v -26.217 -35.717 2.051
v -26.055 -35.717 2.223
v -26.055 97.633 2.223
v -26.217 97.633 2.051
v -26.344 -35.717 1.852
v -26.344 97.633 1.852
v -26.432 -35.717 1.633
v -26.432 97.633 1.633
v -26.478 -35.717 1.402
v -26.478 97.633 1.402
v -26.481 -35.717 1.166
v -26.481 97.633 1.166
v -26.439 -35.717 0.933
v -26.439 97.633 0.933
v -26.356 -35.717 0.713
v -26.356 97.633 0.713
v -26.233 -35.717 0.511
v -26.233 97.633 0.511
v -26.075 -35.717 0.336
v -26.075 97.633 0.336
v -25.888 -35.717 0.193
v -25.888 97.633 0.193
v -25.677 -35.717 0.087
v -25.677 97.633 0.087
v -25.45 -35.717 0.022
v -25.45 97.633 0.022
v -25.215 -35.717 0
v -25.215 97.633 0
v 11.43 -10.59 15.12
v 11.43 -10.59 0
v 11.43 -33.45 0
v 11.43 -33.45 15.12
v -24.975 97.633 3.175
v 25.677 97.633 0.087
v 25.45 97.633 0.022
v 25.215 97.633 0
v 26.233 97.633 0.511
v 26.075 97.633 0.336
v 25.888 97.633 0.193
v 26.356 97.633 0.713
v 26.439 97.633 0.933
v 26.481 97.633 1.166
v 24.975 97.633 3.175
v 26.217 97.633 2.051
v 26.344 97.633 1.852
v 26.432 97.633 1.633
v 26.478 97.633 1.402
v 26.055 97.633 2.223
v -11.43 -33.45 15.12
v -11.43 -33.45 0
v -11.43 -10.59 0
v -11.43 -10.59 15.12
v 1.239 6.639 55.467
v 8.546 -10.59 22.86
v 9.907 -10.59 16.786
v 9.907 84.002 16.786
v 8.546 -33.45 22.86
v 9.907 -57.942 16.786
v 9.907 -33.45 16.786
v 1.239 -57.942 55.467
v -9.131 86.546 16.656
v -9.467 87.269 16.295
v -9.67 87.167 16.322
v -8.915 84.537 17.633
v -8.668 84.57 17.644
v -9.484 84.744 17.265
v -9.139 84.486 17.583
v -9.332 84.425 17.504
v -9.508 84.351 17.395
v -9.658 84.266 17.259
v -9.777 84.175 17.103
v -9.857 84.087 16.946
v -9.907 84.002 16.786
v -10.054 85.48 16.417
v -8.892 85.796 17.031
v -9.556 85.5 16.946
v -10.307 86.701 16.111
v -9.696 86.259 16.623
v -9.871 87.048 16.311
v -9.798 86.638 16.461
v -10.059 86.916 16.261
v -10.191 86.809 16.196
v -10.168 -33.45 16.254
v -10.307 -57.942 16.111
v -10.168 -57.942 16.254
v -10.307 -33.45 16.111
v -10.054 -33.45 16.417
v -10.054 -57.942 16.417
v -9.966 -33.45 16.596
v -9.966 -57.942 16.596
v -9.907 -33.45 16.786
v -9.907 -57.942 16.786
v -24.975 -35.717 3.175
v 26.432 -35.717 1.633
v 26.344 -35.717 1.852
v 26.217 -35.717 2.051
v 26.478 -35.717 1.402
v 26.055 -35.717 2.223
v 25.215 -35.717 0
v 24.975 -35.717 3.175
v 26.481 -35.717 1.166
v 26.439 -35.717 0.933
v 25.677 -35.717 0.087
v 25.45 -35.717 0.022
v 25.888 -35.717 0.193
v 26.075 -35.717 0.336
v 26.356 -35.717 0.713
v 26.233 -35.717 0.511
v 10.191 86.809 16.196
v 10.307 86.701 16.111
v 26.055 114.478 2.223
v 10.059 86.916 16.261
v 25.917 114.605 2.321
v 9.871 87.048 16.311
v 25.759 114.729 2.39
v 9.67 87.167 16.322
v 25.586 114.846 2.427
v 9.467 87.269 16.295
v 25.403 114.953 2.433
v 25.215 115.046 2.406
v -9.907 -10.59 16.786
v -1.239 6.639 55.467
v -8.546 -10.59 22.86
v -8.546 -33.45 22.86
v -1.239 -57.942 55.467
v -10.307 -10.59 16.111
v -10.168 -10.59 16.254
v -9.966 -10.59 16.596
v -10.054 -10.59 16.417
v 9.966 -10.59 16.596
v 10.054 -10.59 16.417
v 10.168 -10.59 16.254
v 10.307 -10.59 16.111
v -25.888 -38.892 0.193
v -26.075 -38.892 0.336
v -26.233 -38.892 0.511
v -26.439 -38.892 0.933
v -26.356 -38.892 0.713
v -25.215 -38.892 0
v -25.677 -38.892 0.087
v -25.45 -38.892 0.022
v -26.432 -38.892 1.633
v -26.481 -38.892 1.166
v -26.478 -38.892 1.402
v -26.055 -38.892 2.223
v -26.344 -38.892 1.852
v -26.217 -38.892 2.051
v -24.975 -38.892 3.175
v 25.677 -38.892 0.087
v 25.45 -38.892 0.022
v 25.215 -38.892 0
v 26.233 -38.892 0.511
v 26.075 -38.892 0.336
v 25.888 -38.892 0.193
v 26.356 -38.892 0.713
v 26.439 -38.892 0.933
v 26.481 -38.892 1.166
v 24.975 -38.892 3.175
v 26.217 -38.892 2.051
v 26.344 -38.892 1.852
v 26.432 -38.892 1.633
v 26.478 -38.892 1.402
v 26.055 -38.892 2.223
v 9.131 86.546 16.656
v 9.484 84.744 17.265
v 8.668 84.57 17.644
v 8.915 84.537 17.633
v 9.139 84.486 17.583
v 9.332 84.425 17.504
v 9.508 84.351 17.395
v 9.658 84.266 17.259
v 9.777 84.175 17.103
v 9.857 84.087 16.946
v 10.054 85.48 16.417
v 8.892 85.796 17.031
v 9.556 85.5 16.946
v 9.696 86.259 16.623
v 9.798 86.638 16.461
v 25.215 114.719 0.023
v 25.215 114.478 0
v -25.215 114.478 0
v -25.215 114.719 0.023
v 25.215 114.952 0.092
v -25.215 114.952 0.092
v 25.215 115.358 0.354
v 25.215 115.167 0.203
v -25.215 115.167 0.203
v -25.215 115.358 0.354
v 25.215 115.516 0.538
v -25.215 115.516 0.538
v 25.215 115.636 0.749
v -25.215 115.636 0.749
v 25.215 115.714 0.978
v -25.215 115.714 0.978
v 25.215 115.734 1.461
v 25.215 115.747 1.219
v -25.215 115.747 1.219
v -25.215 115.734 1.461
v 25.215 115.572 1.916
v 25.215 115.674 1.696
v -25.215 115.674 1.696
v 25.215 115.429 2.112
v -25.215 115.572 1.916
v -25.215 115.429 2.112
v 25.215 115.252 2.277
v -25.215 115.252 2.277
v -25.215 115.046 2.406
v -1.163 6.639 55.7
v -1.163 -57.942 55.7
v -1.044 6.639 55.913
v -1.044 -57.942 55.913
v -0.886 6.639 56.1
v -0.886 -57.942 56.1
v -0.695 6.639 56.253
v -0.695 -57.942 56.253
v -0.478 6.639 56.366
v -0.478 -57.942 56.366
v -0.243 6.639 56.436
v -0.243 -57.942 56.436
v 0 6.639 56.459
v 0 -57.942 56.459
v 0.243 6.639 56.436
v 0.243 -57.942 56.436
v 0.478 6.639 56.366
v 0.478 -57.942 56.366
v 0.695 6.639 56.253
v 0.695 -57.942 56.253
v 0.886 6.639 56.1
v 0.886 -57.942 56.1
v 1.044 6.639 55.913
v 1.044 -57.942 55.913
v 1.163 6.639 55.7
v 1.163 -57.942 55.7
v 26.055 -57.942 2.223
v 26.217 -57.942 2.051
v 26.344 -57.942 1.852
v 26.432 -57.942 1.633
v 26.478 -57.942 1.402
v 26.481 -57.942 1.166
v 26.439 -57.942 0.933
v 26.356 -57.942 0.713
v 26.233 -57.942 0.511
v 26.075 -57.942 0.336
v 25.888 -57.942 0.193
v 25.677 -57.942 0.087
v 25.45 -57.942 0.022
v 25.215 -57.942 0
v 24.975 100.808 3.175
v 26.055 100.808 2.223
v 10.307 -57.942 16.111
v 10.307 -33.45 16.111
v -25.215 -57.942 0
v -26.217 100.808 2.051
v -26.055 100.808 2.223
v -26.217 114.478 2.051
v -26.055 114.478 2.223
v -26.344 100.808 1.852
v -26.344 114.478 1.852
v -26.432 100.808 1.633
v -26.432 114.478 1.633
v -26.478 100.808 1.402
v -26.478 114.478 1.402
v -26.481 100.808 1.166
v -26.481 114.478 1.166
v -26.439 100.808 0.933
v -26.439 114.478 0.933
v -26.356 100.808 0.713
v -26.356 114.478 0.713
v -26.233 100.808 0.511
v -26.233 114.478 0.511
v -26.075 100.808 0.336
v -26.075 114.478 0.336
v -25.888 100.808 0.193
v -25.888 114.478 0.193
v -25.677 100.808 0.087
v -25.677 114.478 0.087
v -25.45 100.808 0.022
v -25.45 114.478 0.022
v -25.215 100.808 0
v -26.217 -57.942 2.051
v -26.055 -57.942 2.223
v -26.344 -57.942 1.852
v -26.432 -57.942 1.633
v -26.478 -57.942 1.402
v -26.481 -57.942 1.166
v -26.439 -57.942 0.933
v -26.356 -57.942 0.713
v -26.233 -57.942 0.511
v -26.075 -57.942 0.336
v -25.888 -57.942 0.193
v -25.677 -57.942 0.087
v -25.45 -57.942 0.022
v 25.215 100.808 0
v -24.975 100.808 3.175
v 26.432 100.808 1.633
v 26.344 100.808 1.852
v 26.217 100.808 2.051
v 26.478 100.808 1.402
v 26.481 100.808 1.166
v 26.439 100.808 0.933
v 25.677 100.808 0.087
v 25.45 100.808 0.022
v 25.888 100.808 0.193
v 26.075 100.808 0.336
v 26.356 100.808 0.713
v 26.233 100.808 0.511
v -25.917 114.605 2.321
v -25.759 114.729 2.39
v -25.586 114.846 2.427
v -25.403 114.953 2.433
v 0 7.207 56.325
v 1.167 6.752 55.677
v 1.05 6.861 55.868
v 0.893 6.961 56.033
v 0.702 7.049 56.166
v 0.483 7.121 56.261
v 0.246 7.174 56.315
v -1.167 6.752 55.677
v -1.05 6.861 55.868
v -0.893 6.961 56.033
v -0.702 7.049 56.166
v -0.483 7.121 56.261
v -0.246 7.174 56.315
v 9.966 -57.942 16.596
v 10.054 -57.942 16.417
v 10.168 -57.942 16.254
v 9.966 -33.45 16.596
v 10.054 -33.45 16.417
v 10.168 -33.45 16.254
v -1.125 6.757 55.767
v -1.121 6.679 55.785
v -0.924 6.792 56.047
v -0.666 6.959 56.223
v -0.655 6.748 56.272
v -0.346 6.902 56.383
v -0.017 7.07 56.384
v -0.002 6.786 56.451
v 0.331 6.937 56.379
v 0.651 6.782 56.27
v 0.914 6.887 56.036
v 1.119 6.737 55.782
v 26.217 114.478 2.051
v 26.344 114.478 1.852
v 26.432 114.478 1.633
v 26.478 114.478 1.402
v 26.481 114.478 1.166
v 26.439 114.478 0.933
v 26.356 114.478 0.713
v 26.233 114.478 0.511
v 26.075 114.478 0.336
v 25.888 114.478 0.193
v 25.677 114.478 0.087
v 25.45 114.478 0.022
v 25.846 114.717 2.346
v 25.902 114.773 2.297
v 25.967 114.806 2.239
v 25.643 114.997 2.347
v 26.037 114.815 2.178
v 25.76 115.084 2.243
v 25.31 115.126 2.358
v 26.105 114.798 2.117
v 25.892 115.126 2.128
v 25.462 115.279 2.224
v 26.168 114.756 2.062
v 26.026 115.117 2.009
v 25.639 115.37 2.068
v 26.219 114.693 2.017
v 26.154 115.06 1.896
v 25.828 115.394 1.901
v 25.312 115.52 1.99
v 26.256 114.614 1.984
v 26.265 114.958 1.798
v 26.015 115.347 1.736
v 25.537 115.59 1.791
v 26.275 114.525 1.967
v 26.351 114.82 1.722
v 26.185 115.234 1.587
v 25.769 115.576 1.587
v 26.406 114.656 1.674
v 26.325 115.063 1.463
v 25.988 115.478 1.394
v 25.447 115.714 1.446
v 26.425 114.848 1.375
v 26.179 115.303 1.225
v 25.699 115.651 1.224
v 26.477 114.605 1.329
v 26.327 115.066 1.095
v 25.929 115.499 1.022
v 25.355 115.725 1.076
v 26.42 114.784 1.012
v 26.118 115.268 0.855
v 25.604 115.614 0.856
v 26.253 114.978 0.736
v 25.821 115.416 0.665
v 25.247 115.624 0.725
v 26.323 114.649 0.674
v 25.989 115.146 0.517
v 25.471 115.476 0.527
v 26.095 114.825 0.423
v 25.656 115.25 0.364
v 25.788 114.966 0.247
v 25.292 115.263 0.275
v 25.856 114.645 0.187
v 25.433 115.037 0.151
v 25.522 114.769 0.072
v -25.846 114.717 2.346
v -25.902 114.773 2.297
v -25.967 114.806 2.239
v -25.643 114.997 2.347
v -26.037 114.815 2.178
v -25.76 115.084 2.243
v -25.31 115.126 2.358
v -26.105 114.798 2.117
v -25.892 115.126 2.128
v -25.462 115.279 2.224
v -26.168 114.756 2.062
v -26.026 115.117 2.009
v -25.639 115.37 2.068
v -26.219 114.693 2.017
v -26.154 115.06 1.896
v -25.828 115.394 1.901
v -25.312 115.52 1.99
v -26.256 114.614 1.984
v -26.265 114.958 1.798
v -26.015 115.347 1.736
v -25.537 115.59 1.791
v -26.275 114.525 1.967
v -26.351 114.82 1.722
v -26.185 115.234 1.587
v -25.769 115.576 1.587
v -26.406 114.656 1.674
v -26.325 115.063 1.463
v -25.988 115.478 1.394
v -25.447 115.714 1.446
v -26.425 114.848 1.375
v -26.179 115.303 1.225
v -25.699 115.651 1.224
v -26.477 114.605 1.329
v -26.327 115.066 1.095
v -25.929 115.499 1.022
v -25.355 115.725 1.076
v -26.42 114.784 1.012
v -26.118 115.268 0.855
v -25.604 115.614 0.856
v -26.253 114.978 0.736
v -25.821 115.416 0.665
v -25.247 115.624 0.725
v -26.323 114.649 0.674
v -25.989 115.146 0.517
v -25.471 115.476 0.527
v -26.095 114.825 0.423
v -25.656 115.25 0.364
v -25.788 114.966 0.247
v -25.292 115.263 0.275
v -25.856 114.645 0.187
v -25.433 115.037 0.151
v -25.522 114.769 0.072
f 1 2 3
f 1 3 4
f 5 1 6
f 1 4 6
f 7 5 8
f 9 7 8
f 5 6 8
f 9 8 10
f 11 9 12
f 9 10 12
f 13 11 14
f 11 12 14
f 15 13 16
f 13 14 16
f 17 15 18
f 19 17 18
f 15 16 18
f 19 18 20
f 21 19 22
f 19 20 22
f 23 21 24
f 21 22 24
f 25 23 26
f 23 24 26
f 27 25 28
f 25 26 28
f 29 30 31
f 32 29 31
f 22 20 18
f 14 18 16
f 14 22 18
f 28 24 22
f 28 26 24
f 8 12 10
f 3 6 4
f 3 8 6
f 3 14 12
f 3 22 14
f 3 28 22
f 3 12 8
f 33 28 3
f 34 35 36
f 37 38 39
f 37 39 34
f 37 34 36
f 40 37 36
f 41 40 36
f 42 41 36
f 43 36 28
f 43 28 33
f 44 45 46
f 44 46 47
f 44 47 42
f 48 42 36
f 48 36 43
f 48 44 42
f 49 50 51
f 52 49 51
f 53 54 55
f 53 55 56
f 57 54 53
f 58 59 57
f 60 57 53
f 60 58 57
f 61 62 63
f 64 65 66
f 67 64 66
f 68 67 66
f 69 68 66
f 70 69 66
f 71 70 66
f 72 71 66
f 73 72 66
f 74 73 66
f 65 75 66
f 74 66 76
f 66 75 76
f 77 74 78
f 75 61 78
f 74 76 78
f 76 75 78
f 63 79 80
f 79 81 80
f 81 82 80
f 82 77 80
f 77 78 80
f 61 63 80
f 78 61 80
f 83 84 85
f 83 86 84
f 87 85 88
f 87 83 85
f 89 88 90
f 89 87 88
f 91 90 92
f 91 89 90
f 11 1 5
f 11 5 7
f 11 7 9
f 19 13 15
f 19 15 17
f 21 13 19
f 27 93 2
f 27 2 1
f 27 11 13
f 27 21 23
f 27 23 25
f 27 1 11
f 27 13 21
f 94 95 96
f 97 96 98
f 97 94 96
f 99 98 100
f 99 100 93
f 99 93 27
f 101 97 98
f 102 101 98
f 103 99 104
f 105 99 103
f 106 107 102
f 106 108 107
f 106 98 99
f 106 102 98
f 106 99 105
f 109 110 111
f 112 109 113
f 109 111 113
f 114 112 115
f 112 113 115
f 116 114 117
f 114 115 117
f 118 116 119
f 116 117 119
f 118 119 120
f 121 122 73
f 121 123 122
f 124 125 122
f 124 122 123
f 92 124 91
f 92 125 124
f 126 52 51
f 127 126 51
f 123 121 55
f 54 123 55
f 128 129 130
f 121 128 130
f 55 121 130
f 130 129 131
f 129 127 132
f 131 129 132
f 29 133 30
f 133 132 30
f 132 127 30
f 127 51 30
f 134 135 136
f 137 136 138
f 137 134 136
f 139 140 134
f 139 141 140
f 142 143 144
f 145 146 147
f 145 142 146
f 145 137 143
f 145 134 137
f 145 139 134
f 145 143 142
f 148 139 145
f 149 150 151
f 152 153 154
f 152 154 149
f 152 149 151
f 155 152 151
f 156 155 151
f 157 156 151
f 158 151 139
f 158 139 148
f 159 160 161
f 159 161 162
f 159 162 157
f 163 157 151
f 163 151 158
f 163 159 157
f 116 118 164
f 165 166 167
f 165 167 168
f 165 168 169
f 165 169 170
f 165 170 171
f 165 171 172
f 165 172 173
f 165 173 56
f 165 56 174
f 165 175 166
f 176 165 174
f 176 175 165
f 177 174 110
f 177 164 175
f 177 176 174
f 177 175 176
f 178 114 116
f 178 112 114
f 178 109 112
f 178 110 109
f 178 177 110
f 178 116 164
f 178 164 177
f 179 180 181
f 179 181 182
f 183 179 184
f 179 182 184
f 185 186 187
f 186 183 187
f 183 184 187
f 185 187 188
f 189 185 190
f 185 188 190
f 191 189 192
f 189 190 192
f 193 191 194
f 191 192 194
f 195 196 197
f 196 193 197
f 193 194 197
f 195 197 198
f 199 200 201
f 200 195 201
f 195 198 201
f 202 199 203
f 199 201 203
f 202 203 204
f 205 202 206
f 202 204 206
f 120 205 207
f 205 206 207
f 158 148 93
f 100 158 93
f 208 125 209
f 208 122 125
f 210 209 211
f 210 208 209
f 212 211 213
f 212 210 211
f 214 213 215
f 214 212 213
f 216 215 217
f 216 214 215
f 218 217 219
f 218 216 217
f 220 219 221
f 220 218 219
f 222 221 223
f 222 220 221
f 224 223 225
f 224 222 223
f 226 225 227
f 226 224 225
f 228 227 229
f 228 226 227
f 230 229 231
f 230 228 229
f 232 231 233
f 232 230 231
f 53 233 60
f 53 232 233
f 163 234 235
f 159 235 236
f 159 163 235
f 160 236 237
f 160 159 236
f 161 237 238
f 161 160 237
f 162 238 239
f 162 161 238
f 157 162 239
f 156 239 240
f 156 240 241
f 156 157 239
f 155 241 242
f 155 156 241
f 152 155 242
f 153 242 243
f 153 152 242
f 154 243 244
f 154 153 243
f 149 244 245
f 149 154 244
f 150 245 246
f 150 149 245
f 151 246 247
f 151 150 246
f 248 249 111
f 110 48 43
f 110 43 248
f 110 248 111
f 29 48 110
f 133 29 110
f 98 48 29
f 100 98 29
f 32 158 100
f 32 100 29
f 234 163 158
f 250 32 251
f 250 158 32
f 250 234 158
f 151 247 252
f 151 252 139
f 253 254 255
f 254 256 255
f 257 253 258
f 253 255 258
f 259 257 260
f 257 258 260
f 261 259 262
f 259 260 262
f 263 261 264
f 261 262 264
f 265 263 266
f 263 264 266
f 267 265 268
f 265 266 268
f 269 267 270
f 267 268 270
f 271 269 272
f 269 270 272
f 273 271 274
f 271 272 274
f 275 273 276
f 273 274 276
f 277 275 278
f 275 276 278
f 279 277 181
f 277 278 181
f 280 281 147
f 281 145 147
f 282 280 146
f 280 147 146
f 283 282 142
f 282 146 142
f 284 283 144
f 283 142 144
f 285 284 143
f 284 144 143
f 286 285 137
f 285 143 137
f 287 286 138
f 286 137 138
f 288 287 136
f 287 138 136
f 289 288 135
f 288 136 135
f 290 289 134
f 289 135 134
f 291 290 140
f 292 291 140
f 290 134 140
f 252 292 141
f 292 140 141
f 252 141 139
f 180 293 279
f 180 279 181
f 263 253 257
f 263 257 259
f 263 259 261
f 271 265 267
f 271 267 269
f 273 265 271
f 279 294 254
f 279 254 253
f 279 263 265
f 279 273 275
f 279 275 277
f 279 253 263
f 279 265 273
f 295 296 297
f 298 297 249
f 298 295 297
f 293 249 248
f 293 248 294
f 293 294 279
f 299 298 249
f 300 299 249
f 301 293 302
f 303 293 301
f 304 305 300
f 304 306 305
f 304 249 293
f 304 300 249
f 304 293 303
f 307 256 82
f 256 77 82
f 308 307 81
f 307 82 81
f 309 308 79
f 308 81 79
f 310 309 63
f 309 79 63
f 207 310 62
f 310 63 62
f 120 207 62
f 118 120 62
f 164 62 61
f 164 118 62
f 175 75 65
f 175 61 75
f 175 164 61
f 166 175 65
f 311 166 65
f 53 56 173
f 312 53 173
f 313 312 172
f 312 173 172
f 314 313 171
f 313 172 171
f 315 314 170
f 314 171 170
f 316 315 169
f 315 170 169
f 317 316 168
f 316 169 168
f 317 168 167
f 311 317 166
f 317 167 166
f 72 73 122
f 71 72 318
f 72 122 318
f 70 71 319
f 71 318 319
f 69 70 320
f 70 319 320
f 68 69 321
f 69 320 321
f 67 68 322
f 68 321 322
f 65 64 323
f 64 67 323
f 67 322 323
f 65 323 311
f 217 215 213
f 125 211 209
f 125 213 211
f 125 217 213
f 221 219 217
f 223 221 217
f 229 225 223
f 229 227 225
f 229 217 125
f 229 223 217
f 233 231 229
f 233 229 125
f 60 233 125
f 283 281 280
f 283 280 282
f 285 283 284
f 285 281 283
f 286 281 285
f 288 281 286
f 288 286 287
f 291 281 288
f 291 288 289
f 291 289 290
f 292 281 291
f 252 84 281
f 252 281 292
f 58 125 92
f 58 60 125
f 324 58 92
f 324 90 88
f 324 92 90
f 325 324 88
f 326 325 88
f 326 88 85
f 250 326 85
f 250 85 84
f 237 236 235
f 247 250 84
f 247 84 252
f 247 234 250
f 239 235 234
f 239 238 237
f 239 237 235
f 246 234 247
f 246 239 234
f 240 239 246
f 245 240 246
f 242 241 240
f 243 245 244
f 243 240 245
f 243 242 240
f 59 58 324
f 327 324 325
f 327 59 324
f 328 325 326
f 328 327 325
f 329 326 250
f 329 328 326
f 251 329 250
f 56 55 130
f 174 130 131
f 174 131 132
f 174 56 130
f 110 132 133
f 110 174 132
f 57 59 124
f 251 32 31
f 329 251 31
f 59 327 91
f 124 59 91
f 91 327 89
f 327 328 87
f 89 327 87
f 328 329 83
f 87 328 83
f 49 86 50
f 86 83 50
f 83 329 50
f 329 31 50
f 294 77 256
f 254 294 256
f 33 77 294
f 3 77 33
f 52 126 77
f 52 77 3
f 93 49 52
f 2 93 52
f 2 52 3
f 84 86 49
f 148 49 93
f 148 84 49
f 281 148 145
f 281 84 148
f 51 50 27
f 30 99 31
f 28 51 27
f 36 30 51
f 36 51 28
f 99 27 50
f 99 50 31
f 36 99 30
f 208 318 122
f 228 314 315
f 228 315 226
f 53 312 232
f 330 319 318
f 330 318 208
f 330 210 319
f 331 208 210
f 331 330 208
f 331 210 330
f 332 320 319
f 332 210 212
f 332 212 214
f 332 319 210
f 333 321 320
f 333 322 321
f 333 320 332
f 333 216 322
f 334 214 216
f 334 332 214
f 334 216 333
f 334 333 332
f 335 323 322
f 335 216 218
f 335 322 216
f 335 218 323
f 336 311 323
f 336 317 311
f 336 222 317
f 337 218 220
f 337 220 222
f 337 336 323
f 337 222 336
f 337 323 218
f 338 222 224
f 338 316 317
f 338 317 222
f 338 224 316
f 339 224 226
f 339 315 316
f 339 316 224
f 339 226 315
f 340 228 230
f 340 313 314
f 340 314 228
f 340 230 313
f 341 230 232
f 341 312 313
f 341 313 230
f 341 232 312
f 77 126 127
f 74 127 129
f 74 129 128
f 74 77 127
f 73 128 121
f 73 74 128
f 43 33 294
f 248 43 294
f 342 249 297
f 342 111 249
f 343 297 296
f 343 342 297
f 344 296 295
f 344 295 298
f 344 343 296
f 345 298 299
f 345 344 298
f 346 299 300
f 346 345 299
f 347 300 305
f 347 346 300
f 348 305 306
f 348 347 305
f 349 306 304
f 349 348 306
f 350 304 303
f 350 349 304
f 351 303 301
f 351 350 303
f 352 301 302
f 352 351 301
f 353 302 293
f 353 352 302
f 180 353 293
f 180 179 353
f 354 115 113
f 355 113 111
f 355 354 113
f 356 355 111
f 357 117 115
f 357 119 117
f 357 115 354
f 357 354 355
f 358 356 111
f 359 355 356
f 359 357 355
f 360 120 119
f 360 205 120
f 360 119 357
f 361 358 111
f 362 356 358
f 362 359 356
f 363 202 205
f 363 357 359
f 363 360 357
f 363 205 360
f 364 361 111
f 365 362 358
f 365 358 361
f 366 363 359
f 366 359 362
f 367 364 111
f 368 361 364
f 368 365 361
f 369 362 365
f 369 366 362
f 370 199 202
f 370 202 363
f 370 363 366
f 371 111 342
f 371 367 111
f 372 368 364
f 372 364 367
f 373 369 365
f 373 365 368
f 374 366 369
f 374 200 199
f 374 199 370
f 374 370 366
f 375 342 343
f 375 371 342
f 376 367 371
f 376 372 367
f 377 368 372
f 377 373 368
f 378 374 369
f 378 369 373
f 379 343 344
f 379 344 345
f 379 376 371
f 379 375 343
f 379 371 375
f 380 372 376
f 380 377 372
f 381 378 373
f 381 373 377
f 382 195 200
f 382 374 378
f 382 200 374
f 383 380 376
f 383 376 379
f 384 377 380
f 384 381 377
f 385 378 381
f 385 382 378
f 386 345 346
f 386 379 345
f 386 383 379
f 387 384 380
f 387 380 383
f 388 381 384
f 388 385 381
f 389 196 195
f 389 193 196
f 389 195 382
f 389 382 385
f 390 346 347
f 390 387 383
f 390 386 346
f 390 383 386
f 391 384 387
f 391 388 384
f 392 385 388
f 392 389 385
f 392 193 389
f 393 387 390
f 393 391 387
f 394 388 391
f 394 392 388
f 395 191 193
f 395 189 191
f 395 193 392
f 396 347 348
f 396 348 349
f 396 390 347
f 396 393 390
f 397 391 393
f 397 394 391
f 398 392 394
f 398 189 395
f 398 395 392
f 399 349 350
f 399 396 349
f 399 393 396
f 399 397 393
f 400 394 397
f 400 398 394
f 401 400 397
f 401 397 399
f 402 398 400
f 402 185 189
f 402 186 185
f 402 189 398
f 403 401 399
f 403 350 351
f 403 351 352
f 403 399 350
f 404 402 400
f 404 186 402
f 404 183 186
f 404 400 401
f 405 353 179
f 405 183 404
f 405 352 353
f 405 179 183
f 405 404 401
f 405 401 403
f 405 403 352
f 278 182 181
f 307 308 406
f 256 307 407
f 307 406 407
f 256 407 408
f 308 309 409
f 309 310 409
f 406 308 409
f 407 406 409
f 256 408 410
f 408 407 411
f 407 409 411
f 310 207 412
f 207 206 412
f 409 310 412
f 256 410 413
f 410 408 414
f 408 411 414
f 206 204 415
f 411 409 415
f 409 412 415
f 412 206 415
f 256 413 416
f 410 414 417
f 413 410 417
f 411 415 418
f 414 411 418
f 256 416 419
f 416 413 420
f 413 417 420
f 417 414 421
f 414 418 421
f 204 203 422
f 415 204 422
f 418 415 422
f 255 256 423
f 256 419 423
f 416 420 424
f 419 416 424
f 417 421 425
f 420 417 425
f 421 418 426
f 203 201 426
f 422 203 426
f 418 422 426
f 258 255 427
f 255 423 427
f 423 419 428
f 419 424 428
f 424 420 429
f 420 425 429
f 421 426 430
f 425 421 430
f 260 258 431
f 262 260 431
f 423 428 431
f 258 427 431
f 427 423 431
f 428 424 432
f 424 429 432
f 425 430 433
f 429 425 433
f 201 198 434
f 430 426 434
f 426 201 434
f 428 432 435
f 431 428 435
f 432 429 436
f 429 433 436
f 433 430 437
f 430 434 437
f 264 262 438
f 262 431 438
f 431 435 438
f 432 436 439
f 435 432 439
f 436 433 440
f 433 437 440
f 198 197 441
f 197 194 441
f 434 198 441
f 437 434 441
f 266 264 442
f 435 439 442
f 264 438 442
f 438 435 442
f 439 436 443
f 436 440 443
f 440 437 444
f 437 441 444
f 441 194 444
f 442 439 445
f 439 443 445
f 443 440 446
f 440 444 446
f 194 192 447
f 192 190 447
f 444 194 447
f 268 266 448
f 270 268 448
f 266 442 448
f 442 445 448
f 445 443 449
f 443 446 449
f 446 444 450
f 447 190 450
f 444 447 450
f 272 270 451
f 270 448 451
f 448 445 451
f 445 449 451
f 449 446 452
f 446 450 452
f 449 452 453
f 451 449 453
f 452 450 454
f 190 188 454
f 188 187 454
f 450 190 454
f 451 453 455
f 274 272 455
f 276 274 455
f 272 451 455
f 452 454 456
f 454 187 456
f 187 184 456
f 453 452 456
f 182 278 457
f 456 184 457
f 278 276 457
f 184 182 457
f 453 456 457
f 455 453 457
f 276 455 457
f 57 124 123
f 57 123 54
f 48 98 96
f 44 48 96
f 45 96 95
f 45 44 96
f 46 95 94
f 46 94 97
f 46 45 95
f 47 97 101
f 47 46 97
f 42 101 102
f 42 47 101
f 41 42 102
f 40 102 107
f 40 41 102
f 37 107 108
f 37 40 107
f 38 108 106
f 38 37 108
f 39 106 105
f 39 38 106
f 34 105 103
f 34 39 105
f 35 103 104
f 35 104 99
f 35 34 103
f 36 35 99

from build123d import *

# Parameters (mm, degrees)
F1_DEPTH = 28.575
F3_DEPTH = 22.86
F5_DEPTH = 177.8
F6_R     = 1.27


with BuildPart() as f1:
    # F0 (on Right) → F1 (new body, symmetric)
    with BuildSketch(Plane.YZ):
        Polygon((-57.9421781003, 88.9), (-57.9421781003, 0), (-38.8921781003, 0), (-38.8921781003, 3.175), (-35.7171781003, 3.175), (-35.7171781003, 0), (97.6328218997, 0), (97.6328218997, 3.175), (100.8078218997, 3.175), (100.8078218997, 0), (119.8578218997, 0), align=None)
    extrude(amount=F1_DEPTH, both=True)

    # F2 (on face) → F3 (cut)
    with BuildSketch(Plane(origin=(0, 0, 0), x_dir=(1, 0, 0), z_dir=(0, 0, -1))):
        Polygon((11.43, 33.4499907649), (0, 33.4499907649), (-11.43, 33.4499907649), (-11.43, 10.5899907649), (0, 10.5899907649), (11.43, 10.5899907649), align=None)
    extrude(amount=-F3_DEPTH, mode=Mode.SUBTRACT)

    # F4 (on face) → F5 (intersect)
    with BuildSketch(Plane.XZ.offset(57.9421781003)):
        Polygon((-9.9975576818, 16.3837641232), (-28.575, 0), (28.575, 0), (9.9975576818, 16.3837641232), (0, 60.9972961555), align=None)
    extrude(amount=-F5_DEPTH, mode=Mode.INTERSECT)

    # F6
    f6_edges = [f1.edges().sort_by_distance(p)[0] for p in [
        (0, 119.857822, 0),
        (4.998779, 42.476762, 38.69053),
        (-4.998779, 42.476762, 38.69053),
        (19.286279, 103.474058, 8.191882),
        (-19.286279, 103.474058, 8.191882),
        (0, -30.039474, 60.997296),
        (9.997558, 38.250151, 16.383764),
        (28.575, 30.957822, 0),
        (28.575, -48.417178, 0),
        (28.575, 110.332822, 0),
        (-28.575, 110.332822, 0),
        (-28.575, 30.957822, 0),
        (-28.575, -48.417178, 0),
        (-9.997558, 38.250151, 16.383764),
        (-9.997558, -45.696084, 16.383764),
        (9.997558, -45.696084, 16.383764),
    ]]
    fillet(f6_edges, radius=F6_R)


solid = f1.part
